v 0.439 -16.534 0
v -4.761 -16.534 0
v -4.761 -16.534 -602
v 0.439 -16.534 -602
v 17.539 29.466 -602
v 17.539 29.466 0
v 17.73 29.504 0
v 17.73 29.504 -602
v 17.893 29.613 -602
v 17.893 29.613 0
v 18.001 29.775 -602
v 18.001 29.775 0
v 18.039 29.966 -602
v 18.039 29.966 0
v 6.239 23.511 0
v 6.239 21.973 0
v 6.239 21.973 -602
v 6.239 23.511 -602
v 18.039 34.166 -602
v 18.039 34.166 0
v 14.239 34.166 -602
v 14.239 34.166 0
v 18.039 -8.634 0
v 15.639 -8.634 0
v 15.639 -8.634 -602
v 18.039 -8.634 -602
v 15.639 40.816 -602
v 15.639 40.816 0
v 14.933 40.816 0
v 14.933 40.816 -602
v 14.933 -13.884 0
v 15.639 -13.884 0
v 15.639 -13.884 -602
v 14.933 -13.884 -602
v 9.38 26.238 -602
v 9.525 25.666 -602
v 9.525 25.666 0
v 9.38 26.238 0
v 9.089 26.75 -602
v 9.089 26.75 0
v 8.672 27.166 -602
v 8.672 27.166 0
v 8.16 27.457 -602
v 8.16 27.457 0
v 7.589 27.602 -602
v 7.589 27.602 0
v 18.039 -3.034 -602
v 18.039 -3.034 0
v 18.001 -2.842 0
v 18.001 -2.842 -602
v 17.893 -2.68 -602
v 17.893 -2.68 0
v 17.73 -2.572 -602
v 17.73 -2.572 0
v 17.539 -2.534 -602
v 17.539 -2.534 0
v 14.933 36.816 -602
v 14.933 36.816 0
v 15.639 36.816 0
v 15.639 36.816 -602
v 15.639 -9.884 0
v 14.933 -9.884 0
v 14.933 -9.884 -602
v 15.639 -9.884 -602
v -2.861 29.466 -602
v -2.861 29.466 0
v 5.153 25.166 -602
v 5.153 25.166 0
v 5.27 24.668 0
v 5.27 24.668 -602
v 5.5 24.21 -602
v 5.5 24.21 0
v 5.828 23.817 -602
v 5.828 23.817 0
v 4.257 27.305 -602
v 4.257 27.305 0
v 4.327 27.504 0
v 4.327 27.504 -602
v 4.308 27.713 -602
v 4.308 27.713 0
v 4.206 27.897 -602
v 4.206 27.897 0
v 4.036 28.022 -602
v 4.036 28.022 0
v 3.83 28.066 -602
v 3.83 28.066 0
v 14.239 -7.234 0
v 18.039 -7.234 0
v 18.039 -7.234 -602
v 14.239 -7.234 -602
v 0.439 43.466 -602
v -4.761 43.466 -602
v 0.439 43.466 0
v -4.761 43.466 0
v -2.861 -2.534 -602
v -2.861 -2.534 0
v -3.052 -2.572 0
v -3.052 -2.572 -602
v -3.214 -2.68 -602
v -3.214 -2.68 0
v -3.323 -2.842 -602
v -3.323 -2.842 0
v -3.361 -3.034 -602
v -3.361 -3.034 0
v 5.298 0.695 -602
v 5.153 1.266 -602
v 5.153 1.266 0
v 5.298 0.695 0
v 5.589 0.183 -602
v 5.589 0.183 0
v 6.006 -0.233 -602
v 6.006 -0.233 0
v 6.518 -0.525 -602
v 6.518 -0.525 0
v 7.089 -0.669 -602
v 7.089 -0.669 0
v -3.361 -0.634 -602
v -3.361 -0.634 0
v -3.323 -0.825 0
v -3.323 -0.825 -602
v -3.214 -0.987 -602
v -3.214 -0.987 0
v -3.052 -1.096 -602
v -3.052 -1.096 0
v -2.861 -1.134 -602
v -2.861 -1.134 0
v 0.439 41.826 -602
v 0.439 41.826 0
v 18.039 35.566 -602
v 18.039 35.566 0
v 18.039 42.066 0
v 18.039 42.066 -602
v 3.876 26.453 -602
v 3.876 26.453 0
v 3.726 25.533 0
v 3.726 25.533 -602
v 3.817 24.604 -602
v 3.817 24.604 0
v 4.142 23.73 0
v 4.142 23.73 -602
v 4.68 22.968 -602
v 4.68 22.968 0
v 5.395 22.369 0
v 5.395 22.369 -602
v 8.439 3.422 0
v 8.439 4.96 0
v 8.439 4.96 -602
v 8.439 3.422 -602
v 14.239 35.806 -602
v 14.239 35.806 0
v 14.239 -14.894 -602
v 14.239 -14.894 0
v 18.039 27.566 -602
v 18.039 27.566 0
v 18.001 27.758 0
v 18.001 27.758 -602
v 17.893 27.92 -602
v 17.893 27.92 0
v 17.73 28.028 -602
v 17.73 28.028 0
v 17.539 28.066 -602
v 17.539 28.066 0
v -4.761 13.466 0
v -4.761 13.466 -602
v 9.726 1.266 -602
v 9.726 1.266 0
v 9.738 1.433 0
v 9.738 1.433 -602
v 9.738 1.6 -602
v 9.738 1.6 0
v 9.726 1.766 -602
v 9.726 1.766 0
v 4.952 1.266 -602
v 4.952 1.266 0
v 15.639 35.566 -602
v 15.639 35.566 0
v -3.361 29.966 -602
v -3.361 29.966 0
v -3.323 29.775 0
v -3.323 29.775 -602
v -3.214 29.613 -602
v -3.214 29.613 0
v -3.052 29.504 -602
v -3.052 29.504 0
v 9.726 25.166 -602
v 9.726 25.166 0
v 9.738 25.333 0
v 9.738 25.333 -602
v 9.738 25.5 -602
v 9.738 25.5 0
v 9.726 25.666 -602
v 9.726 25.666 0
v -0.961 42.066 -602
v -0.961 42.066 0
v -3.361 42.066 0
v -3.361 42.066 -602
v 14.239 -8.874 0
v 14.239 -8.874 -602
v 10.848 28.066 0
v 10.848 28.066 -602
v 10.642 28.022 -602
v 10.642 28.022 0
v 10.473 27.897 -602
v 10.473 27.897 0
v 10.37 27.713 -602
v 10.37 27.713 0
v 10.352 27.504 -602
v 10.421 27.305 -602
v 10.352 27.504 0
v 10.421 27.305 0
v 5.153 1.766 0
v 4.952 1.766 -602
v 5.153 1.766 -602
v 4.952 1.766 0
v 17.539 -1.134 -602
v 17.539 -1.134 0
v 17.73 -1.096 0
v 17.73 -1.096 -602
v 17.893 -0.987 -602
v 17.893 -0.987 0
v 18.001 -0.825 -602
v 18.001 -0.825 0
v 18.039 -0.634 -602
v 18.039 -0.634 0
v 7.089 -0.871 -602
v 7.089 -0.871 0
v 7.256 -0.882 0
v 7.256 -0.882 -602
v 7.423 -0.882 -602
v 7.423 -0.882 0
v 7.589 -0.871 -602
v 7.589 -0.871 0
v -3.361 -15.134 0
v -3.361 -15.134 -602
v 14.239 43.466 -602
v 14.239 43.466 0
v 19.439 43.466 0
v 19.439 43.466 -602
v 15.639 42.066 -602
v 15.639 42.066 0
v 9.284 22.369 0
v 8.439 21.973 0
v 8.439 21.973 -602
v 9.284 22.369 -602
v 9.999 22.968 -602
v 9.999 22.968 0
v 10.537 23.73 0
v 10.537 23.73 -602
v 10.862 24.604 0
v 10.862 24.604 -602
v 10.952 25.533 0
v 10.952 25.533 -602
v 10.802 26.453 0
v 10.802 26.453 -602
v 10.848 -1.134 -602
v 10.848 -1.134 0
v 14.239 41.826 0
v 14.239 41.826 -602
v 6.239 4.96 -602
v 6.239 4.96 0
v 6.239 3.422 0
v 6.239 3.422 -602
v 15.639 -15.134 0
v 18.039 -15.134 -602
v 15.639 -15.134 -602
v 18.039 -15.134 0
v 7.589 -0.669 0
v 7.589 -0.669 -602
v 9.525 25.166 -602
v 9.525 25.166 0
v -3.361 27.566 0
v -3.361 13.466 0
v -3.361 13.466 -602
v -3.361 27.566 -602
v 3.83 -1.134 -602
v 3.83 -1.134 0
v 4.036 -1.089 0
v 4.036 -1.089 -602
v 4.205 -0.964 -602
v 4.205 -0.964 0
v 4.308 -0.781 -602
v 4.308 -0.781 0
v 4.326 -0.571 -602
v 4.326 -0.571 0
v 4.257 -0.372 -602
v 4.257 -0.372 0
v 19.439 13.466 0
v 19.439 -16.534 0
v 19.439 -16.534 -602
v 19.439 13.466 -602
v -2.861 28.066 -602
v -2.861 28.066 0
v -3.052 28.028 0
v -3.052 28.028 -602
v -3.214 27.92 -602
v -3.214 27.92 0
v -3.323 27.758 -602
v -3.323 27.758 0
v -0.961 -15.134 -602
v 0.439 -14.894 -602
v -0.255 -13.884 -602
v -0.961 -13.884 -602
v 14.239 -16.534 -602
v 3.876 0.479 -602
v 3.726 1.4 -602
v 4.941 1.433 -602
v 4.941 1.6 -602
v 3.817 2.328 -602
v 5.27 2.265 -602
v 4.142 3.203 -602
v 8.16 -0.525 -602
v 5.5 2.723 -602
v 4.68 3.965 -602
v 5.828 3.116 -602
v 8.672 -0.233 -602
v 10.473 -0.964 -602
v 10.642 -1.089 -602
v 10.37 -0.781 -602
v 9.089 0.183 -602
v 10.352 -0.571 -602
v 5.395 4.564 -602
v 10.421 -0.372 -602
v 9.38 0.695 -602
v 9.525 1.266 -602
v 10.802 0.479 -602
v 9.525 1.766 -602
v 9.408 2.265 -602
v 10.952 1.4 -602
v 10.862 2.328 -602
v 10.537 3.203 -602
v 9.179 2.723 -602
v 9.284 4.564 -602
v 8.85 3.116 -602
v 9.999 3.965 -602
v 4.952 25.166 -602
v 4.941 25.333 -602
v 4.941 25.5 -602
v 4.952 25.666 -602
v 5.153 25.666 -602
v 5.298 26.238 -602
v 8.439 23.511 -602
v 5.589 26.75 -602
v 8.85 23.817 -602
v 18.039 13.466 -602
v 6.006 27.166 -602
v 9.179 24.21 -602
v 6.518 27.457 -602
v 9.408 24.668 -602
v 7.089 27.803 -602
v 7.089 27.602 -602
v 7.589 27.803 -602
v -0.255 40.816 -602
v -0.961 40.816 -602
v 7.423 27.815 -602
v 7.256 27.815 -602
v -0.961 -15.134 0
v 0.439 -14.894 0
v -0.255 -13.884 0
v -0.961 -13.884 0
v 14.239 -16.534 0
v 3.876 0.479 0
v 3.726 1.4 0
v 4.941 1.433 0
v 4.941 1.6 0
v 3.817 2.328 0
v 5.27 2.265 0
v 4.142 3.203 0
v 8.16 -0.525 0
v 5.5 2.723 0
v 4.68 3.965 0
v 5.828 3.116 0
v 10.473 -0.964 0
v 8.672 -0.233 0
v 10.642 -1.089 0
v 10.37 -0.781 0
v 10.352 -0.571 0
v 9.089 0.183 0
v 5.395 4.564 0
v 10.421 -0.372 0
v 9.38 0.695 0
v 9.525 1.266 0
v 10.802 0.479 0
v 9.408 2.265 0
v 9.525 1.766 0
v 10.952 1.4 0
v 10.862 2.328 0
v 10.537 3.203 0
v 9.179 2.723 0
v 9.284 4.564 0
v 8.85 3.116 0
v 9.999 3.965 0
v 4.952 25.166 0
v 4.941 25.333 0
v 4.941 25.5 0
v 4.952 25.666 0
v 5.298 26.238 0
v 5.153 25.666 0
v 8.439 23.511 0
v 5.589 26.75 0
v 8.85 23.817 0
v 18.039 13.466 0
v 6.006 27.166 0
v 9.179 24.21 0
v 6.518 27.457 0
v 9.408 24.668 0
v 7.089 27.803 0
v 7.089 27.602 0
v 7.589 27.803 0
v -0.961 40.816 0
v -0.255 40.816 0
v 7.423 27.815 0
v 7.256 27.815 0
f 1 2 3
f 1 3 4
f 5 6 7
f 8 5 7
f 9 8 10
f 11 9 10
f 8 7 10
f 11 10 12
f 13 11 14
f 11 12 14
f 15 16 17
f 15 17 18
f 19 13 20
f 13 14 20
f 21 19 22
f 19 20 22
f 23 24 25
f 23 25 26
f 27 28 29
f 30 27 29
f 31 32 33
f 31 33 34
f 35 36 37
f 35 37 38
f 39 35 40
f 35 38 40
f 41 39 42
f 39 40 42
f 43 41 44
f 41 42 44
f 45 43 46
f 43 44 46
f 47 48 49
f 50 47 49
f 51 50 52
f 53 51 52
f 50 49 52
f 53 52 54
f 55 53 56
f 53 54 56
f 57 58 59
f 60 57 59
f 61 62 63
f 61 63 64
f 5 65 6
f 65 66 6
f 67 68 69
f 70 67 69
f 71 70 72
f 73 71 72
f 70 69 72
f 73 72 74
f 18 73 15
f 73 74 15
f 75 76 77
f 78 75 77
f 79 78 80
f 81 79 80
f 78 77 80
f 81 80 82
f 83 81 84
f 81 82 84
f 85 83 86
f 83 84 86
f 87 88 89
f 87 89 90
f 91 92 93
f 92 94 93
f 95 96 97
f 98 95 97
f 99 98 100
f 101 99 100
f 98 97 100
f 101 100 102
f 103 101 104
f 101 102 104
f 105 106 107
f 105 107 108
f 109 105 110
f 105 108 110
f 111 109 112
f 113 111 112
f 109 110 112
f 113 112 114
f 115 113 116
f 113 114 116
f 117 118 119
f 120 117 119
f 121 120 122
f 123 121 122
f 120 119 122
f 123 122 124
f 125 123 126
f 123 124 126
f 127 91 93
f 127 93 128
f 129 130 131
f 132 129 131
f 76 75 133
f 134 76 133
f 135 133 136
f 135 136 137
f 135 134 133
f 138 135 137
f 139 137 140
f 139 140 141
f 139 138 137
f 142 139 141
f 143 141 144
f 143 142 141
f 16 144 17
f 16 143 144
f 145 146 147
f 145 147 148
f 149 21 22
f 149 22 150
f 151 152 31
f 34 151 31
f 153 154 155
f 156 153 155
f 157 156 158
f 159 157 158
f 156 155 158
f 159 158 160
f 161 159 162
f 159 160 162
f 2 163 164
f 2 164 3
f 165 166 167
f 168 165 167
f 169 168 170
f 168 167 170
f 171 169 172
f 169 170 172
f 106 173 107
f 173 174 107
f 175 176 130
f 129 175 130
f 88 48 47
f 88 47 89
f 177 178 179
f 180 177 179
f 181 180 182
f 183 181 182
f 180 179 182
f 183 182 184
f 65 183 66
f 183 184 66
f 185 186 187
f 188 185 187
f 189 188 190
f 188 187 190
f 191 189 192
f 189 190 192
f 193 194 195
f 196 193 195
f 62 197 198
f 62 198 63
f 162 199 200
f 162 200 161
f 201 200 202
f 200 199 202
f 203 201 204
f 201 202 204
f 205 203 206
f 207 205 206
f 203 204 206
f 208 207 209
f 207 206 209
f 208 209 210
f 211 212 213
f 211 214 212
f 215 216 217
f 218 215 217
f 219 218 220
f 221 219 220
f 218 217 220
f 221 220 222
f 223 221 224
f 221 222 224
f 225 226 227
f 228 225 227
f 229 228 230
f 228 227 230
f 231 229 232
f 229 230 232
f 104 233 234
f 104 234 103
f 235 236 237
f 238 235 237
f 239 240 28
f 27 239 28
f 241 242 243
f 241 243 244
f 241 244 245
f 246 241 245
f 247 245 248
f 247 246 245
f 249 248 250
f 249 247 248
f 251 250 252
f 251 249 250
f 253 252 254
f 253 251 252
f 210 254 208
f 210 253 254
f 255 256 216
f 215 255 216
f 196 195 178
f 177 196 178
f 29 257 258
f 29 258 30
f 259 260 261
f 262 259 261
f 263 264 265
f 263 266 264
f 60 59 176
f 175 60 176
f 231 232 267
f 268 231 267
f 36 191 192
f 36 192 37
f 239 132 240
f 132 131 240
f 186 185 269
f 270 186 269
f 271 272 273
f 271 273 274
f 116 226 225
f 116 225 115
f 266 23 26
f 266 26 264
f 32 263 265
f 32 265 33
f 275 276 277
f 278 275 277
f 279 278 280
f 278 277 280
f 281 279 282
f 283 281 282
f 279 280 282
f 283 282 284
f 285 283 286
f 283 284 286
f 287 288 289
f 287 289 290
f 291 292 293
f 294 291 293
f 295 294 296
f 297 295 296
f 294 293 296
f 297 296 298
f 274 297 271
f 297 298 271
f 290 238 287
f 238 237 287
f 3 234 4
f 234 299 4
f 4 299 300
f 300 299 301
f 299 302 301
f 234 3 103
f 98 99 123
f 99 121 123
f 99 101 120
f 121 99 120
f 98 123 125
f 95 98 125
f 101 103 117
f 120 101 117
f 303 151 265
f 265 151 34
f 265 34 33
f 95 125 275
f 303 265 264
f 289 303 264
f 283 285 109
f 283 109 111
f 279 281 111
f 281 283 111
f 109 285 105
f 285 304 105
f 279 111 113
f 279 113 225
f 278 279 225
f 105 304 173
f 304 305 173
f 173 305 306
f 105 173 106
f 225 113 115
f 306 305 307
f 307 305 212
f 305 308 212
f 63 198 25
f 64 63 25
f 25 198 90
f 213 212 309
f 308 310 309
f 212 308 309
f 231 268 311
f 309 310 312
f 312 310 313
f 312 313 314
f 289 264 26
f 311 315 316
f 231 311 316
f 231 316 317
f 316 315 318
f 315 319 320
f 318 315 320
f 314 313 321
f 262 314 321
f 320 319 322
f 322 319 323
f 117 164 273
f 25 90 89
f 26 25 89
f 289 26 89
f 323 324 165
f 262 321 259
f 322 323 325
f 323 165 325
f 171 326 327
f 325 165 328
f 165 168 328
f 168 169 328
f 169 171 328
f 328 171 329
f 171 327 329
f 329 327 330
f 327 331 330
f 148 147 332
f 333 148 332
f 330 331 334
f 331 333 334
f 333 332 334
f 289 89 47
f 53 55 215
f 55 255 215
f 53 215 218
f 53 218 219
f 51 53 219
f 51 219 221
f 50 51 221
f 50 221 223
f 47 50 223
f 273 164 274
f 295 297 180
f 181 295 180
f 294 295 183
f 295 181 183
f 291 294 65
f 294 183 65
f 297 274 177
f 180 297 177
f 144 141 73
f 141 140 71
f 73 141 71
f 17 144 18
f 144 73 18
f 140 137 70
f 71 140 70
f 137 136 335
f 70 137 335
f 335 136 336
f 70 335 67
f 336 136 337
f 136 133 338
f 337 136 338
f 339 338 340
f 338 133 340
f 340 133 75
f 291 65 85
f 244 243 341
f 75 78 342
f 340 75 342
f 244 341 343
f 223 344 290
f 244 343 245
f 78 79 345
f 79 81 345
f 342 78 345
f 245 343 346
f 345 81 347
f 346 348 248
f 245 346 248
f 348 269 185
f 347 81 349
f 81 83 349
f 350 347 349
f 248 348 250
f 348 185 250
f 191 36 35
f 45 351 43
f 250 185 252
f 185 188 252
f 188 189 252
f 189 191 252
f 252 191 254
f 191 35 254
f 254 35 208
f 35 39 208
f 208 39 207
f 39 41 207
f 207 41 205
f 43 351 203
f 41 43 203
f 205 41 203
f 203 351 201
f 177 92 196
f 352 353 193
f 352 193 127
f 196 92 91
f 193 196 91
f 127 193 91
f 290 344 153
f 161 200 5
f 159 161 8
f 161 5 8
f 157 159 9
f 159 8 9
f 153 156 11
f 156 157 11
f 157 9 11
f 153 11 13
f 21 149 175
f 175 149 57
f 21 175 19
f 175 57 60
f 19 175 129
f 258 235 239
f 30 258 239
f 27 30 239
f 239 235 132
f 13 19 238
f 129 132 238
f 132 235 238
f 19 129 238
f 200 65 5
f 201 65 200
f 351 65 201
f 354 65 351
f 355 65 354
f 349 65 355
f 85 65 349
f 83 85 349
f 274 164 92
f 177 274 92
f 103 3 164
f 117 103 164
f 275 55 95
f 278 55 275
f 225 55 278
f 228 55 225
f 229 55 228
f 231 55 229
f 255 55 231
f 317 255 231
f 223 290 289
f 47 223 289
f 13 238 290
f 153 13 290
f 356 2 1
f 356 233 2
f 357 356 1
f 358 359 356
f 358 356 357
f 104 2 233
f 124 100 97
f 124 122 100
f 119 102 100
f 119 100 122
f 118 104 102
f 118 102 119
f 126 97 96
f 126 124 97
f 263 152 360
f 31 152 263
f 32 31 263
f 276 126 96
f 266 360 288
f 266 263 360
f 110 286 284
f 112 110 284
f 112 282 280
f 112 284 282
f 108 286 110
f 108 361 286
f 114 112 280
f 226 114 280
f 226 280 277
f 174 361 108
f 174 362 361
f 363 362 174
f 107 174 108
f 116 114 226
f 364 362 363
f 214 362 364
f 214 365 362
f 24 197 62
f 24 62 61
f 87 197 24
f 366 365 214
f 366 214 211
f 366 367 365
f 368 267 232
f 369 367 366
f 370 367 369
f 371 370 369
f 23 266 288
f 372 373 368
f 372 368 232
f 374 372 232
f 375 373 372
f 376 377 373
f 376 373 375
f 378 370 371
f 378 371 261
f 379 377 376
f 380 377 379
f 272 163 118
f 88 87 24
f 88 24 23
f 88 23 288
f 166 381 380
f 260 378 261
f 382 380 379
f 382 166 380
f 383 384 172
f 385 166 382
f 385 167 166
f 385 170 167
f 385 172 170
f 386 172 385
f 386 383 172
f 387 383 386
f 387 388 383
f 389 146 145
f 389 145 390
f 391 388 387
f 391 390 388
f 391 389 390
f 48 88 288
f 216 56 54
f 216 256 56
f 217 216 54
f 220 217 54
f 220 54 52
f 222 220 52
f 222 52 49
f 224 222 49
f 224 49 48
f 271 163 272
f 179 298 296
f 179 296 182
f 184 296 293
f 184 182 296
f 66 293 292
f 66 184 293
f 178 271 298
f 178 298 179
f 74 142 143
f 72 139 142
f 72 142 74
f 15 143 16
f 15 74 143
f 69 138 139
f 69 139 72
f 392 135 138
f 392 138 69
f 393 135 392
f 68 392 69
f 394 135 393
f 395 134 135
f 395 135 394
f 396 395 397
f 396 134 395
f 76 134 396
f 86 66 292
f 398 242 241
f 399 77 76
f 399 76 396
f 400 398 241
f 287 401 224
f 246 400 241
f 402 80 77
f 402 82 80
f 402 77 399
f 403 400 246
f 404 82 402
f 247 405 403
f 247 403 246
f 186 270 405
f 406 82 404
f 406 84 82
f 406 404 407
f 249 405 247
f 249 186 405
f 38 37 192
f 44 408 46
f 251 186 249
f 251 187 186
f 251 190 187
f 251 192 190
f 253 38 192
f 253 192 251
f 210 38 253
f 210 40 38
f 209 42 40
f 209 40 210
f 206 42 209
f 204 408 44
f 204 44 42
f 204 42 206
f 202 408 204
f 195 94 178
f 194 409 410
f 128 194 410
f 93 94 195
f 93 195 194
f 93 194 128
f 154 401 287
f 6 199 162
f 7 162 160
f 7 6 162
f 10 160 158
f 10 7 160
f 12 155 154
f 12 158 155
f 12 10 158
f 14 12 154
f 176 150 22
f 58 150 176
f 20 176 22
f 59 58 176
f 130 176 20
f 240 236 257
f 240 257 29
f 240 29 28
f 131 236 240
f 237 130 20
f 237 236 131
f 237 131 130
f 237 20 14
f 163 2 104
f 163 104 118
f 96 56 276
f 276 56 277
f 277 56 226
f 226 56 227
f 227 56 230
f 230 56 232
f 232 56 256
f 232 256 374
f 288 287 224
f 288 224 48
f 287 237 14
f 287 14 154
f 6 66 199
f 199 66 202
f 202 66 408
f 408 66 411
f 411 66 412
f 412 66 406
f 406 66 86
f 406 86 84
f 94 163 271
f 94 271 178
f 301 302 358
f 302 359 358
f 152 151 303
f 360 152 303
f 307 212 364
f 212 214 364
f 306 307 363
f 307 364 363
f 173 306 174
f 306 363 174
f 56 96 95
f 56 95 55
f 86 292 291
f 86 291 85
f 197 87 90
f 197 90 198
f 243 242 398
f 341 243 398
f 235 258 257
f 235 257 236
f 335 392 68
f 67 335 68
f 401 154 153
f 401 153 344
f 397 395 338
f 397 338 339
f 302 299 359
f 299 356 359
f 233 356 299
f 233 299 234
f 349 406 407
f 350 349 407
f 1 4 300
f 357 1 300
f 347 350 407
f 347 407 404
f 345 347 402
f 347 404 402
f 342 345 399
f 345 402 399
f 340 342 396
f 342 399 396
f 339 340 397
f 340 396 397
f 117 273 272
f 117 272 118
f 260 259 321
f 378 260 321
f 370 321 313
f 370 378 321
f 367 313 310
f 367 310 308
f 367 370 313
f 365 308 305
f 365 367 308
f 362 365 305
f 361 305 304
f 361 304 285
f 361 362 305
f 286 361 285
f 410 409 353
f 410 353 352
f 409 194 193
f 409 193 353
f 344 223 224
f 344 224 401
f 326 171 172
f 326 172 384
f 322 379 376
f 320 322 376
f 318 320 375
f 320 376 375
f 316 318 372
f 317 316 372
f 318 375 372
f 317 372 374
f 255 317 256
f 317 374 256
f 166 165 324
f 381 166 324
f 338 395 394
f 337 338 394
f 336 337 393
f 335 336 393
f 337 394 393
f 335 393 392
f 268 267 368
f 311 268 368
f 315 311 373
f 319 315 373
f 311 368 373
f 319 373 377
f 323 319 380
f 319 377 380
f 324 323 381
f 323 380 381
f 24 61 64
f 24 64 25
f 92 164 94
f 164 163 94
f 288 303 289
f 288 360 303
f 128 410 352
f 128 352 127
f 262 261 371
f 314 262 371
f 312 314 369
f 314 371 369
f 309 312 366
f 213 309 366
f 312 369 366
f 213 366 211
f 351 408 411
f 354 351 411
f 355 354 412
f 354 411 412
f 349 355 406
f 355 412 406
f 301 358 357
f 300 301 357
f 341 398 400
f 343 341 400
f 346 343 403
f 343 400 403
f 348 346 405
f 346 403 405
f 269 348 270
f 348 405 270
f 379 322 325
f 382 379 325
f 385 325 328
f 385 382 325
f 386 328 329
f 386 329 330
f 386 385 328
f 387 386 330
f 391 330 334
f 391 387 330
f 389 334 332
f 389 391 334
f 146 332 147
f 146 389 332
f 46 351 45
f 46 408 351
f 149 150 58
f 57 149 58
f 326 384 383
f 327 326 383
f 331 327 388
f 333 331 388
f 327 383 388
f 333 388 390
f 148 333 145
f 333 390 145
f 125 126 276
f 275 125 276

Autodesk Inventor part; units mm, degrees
ref_plane "YZ Plane" through (0, 0, 0) normal (1, 0, 0) x (0, 1, 0)
ref_plane "XZ Plane" through (0, 0, 0) normal (0, 1, 0) x (-1, 0, 0)
ref_plane "XY Plane" through (0, 0, 0) normal (0, 0, 1) x (1, 0, 0)
sketch "Boceto1" plane through (0, 0, 0) normal (0, 0, 1) x (1, 0, 0)
  line L0 (-4.7609, 13.4664) -> (-4.7609, -16.5336)
  line L1 (-4.7609, -16.5336) -> (0.4391, -16.5336)
  line L2 (0.4391, -16.5336) -> (0.4391, -14.8936)
  line L3 (-0.9609, -15.1336) -> (-3.3609, -15.1336)
  line L4 (-3.3609, -15.1336) -> (-3.3609, -3.0336)
  line L5 (-2.8609, -2.5336) -> (17.5391, -2.5336)
  line L6 (18.0391, -3.0336) -> (18.0391, -7.2336)
  line L7 (18.0391, -7.2336) -> (14.2391, -7.2336)
  line L8 (14.2391, -7.2336) -> (14.2391, -8.8736)
  line L9 (14.9333, -9.8836) -> (15.6391, -9.8836)
  line L10 (15.6391, -9.8836) -> (15.6391, -8.6336)
  line L11 (15.6391, -8.6336) -> (18.0391, -8.6336)
  line L12 (18.0391, -8.6336) -> (18.0391, -15.1336)
  line L13 (18.0391, -15.1336) -> (15.6391, -15.1336)
  line L14 (15.6391, -15.1336) -> (15.6391, -13.8836)
  line L15 (15.6391, -13.8836) -> (14.9333, -13.8836)
  line L16 (14.2391, -14.8936) -> (14.2391, -16.5336)
  line L17 (14.2391, -16.5336) -> (19.4391, -16.5336)
  line L18 (19.4391, -16.5336) -> (19.4391, 13.4664)
  line L19 (-3.3609, 13.4664) -> (-3.3609, -0.6336)
  line L20 (18.0391, -0.6336) -> (18.0391, 13.4664)
  line L21 (7.3391, 11.7517) -> (7.3391, -2.5336) construction
  arc A0 (6.2391, 3.4216) -> (8.4391, 3.4216) centre (7.3391, 1.5164) ccw
  line L22 (-8.4881, 13.4664) -> (24.4446, 13.4664) construction
  line L23 (4.9522, 1.2664) -> (5.1534, 1.2664)
  line L24 (4.9522, 1.7664) -> (5.1534, 1.7664)
  line L25 (-2.8609, -1.1336) -> (3.8304, -1.1336)
  line L26 (10.8478, -1.1336) -> (17.5391, -1.1336)
  line L27 (4.0797, 1.5164) -> (9.7739, 1.5164) construction
  line L28 (9.726, 1.2664) -> (9.5249, 1.2664)
  line L29 (9.726, 1.7664) -> (9.5249, 1.7664)
  line L30 (7.5891, -0.8706) -> (7.5891, -0.6694)
  line L31 (7.0891, -0.8706) -> (7.0891, -0.6694)
  arc A1 (7.0891, -0.8706) -> (7.5891, -0.8706) centre (7.3391, 1.5164) ccw
  arc A2 (9.726, 1.2664) -> (9.726, 1.7664) centre (7.3391, 1.5164) ccw
  arc A3 (4.9522, 1.7664) -> (4.9522, 1.2664) centre (7.3391, 1.5164) ccw
  circle A4 centre (7.3391, 1.5164) radius 2.4 construction
  line L32 (6.2391, 4.9599) -> (6.2391, 3.4216)
  line L33 (8.4391, 4.9599) -> (8.4391, 3.4216)
  arc A5 (10.4214, -0.3724) -> (8.4391, 4.9599) centre (7.3391, 1.5164) ccw
  arc A6 (6.2391, 4.9599) -> (4.2568, -0.3724) centre (7.3391, 1.5164) ccw
  line L34 (-0.9609, -15.1336) -> (-0.9609, -13.8836)
  line L35 (-0.9609, -13.8836) -> (-0.2551, -13.8836)
  line L36 (-0.2551, -13.8836) -> (0.4391, -14.8936)
  line L37 (14.2391, -8.8736) -> (14.9333, -9.8836)
  line L38 (14.2391, -14.8936) -> (14.9333, -13.8836)
  arc A7 (-2.8609, -2.5336) -> (-3.3609, -3.0336) centre (-2.8609, -3.0336) ccw
  arc A8 (-3.3609, -0.6336) -> (-2.8609, -1.1336) centre (-2.8609, -0.6336) ccw
  arc A9 (17.5391, -1.1336) -> (18.0391, -0.6336) centre (17.5391, -0.6336) ccw
  arc A10 (18.0391, -3.0336) -> (17.5391, -2.5336) centre (17.5391, -3.0336) ccw
  arc A11 (3.8304, -1.1336) -> (4.2568, -0.3724) centre (3.8304, -0.6336) ccw
  arc A12 (10.4214, -0.3724) -> (10.8478, -1.1336) centre (10.8478, -0.6336) ccw
  line L39 (-4.7609, 13.4664) -> (-4.7609, 43.4664)
  line L40 (-4.7609, 43.4664) -> (0.4391, 43.4664)
  line L41 (0.4391, 43.4664) -> (0.4391, 41.8264)
  line L42 (-0.9609, 42.0664) -> (-3.3609, 42.0664)
  line L43 (-3.3609, 42.0664) -> (-3.3609, 29.9664)
  line L44 (-2.8609, 29.4664) -> (17.5391, 29.4664)
  line L45 (18.0391, 29.9664) -> (18.0391, 34.1664)
  line L46 (18.0391, 34.1664) -> (14.2391, 34.1664)
  line L47 (14.2391, 34.1664) -> (14.2391, 35.8064)
  line L48 (14.9333, 36.8164) -> (15.6391, 36.8164)
  line L49 (15.6391, 36.8164) -> (15.6391, 35.5664)
  line L50 (15.6391, 35.5664) -> (18.0391, 35.5664)
  line L51 (18.0391, 35.5664) -> (18.0391, 42.0664)
  line L52 (18.0391, 42.0664) -> (15.6391, 42.0664)
  line L53 (15.6391, 42.0664) -> (15.6391, 40.8164)
  line L54 (15.6391, 40.8164) -> (14.9333, 40.8164)
  line L55 (14.2391, 41.8264) -> (14.2391, 43.4664)
  line L56 (14.2391, 43.4664) -> (19.4391, 43.4664)
  line L57 (19.4391, 43.4664) -> (19.4391, 13.4664)
  line L58 (-3.3609, 13.4664) -> (-3.3609, 27.5664)
  line L59 (18.0391, 27.5664) -> (18.0391, 13.4664)
  line L60 (7.3391, 15.181) -> (7.3391, 29.4664) construction
  arc A13 (8.4391, 23.5111) -> (6.2391, 23.5111) centre (7.3391, 25.4164) ccw
  line L61 (4.9522, 25.6664) -> (5.1534, 25.6664)
  line L62 (4.9522, 25.1664) -> (5.1534, 25.1664)
  line L63 (-2.8609, 28.0664) -> (3.8304, 28.0664)
  line L64 (10.8478, 28.0664) -> (17.5391, 28.0664)
  line L65 (4.0797, 25.4164) -> (9.7739, 25.4164) construction
  line L66 (9.726, 25.6664) -> (9.5249, 25.6664)
  line L67 (9.726, 25.1664) -> (9.5249, 25.1664)
  line L68 (7.5891, 27.8033) -> (7.5891, 27.6021)
  line L69 (7.0891, 27.8033) -> (7.0891, 27.6021)
  arc A14 (7.5891, 27.8033) -> (7.0891, 27.8033) centre (7.3391, 25.4164) ccw
  arc A15 (9.726, 25.1664) -> (9.726, 25.6664) centre (7.3391, 25.4164) ccw
  arc A16 (4.9522, 25.6664) -> (4.9522, 25.1664) centre (7.3391, 25.4164) ccw
  circle A17 centre (7.3391, 25.4164) radius 2.4 construction
  line L70 (6.2391, 21.9728) -> (6.2391, 23.5111)
  line L71 (8.4391, 21.9728) -> (8.4391, 23.5111)
  arc A18 (8.4391, 21.9728) -> (10.4214, 27.3051) centre (7.3391, 25.4164) ccw
  arc A19 (4.2568, 27.3051) -> (6.2391, 21.9728) centre (7.3391, 25.4164) ccw
  line L72 (-0.9609, 42.0664) -> (-0.9609, 40.8164)
  line L73 (-0.9609, 40.8164) -> (-0.2551, 40.8164)
  line L74 (-0.2551, 40.8164) -> (0.4391, 41.8264)
  line L75 (14.2391, 35.8064) -> (14.9333, 36.8164)
  line L76 (14.2391, 41.8264) -> (14.9333, 40.8164)
  arc A20 (-3.3609, 29.9664) -> (-2.8609, 29.4664) centre (-2.8609, 29.9664) ccw
  arc A21 (-2.8609, 28.0664) -> (-3.3609, 27.5664) centre (-2.8609, 27.5664) ccw
  arc A22 (18.0391, 27.5664) -> (17.5391, 28.0664) centre (17.5391, 27.5664) ccw
  arc A23 (17.5391, 29.4664) -> (18.0391, 29.9664) centre (17.5391, 29.9664) ccw
  arc A24 (4.2568, 27.3051) -> (3.8304, 28.0664) centre (3.8304, 27.5664) ccw
  arc A25 (10.8478, 28.0664) -> (10.4214, 27.3051) centre (10.8478, 27.5664) ccw
  point P0 (4.8803, -1.1336)
  point P1 (9.7979, -1.1336)
  point P2 (7.3391, -2.5336)
  point P3 (18.0391, -11.8836)
  point P4 (4.8803, 28.0664)
  point P5 (9.7979, 28.0664)
  point P6 (7.3391, 29.4664)
  point P7 (18.0391, 38.8164)
  dimension "d0" = 1.4
  dimension "d1" = 1.4
  dimension "d2" = 1.4
  dimension "d3" = 1.4
  dimension "d4" = 1.4
  dimension "d5" = 1.4
  dimension "d6" = 1.4
  dimension "d7" = 1.4
  dimension "d8" = 1.4
  dimension "d9" = 1.4
  dimension "d12" = 4.4
  dimension "d19" = 0.5
  dimension "d22" = 4.05
  dimension "d24" = 0.25
  dimension "d25" = 0.25
  dimension "d26" = 0.5
  dimension "d30" = 0.5
  dimension "d32" = 4.8
  dimension "d35" = 1.1
  dimension "d36" = 2.2
  dimension "d37" = 1.415
  dimension "d38" = 1.415
  dimension "d39" = 0.2
  dimension "d40" = 0.2
  dimension "d42" = 30
  dimension "d43" = 14
  dimension "d44" = 4
  dimension "d45" = 9.3
  dimension "d46" = 6.5
  dimension "d47" = 24.2
  dimension "d48" = 5.2
  dimension "d49" = 1.4
  dimension "d50" = 5.2
  dimension "d51" = 13.8
  dimension "d52" = 21.4
  dimension "d53" = 0.2
  dimension "d55" = 0.2
  dimension "d56" = 0.25
  dimension "d57" = 0.2
  dimension "d58" = 1.4
  dimension "d62" = 1.4
  dimension "d63" = 2.65
  dimension "d64" = 1.64
  dimension "d65" = 34.5
  dimension "d66" = 2
  dimension "d67" = 2
  dimension "d68" = 2.4
  dimension "d69" = 3.01
  dimension "d70" = 6.02
  dimension "d71" = 34.5
  dimension "d72" = 111
  dimension "d74" = 0.7058
  dimension "d75" = 0.7058
  dimension "d82" = 9.6652
  dimension "d83" = 25.6354
  dimension "d84" = 15.3594
  dimension "d86" = 0.5
  dimension "d87" = 0.5
  dimension "d88" = 60
  dimension "d89" = 30.6
extrude "Extrusión1" add sketch "Boceto1" against normal blind 602
properties part number "SP40-04A TRAVESAÑO CENTRAL" material "Aluminio"
